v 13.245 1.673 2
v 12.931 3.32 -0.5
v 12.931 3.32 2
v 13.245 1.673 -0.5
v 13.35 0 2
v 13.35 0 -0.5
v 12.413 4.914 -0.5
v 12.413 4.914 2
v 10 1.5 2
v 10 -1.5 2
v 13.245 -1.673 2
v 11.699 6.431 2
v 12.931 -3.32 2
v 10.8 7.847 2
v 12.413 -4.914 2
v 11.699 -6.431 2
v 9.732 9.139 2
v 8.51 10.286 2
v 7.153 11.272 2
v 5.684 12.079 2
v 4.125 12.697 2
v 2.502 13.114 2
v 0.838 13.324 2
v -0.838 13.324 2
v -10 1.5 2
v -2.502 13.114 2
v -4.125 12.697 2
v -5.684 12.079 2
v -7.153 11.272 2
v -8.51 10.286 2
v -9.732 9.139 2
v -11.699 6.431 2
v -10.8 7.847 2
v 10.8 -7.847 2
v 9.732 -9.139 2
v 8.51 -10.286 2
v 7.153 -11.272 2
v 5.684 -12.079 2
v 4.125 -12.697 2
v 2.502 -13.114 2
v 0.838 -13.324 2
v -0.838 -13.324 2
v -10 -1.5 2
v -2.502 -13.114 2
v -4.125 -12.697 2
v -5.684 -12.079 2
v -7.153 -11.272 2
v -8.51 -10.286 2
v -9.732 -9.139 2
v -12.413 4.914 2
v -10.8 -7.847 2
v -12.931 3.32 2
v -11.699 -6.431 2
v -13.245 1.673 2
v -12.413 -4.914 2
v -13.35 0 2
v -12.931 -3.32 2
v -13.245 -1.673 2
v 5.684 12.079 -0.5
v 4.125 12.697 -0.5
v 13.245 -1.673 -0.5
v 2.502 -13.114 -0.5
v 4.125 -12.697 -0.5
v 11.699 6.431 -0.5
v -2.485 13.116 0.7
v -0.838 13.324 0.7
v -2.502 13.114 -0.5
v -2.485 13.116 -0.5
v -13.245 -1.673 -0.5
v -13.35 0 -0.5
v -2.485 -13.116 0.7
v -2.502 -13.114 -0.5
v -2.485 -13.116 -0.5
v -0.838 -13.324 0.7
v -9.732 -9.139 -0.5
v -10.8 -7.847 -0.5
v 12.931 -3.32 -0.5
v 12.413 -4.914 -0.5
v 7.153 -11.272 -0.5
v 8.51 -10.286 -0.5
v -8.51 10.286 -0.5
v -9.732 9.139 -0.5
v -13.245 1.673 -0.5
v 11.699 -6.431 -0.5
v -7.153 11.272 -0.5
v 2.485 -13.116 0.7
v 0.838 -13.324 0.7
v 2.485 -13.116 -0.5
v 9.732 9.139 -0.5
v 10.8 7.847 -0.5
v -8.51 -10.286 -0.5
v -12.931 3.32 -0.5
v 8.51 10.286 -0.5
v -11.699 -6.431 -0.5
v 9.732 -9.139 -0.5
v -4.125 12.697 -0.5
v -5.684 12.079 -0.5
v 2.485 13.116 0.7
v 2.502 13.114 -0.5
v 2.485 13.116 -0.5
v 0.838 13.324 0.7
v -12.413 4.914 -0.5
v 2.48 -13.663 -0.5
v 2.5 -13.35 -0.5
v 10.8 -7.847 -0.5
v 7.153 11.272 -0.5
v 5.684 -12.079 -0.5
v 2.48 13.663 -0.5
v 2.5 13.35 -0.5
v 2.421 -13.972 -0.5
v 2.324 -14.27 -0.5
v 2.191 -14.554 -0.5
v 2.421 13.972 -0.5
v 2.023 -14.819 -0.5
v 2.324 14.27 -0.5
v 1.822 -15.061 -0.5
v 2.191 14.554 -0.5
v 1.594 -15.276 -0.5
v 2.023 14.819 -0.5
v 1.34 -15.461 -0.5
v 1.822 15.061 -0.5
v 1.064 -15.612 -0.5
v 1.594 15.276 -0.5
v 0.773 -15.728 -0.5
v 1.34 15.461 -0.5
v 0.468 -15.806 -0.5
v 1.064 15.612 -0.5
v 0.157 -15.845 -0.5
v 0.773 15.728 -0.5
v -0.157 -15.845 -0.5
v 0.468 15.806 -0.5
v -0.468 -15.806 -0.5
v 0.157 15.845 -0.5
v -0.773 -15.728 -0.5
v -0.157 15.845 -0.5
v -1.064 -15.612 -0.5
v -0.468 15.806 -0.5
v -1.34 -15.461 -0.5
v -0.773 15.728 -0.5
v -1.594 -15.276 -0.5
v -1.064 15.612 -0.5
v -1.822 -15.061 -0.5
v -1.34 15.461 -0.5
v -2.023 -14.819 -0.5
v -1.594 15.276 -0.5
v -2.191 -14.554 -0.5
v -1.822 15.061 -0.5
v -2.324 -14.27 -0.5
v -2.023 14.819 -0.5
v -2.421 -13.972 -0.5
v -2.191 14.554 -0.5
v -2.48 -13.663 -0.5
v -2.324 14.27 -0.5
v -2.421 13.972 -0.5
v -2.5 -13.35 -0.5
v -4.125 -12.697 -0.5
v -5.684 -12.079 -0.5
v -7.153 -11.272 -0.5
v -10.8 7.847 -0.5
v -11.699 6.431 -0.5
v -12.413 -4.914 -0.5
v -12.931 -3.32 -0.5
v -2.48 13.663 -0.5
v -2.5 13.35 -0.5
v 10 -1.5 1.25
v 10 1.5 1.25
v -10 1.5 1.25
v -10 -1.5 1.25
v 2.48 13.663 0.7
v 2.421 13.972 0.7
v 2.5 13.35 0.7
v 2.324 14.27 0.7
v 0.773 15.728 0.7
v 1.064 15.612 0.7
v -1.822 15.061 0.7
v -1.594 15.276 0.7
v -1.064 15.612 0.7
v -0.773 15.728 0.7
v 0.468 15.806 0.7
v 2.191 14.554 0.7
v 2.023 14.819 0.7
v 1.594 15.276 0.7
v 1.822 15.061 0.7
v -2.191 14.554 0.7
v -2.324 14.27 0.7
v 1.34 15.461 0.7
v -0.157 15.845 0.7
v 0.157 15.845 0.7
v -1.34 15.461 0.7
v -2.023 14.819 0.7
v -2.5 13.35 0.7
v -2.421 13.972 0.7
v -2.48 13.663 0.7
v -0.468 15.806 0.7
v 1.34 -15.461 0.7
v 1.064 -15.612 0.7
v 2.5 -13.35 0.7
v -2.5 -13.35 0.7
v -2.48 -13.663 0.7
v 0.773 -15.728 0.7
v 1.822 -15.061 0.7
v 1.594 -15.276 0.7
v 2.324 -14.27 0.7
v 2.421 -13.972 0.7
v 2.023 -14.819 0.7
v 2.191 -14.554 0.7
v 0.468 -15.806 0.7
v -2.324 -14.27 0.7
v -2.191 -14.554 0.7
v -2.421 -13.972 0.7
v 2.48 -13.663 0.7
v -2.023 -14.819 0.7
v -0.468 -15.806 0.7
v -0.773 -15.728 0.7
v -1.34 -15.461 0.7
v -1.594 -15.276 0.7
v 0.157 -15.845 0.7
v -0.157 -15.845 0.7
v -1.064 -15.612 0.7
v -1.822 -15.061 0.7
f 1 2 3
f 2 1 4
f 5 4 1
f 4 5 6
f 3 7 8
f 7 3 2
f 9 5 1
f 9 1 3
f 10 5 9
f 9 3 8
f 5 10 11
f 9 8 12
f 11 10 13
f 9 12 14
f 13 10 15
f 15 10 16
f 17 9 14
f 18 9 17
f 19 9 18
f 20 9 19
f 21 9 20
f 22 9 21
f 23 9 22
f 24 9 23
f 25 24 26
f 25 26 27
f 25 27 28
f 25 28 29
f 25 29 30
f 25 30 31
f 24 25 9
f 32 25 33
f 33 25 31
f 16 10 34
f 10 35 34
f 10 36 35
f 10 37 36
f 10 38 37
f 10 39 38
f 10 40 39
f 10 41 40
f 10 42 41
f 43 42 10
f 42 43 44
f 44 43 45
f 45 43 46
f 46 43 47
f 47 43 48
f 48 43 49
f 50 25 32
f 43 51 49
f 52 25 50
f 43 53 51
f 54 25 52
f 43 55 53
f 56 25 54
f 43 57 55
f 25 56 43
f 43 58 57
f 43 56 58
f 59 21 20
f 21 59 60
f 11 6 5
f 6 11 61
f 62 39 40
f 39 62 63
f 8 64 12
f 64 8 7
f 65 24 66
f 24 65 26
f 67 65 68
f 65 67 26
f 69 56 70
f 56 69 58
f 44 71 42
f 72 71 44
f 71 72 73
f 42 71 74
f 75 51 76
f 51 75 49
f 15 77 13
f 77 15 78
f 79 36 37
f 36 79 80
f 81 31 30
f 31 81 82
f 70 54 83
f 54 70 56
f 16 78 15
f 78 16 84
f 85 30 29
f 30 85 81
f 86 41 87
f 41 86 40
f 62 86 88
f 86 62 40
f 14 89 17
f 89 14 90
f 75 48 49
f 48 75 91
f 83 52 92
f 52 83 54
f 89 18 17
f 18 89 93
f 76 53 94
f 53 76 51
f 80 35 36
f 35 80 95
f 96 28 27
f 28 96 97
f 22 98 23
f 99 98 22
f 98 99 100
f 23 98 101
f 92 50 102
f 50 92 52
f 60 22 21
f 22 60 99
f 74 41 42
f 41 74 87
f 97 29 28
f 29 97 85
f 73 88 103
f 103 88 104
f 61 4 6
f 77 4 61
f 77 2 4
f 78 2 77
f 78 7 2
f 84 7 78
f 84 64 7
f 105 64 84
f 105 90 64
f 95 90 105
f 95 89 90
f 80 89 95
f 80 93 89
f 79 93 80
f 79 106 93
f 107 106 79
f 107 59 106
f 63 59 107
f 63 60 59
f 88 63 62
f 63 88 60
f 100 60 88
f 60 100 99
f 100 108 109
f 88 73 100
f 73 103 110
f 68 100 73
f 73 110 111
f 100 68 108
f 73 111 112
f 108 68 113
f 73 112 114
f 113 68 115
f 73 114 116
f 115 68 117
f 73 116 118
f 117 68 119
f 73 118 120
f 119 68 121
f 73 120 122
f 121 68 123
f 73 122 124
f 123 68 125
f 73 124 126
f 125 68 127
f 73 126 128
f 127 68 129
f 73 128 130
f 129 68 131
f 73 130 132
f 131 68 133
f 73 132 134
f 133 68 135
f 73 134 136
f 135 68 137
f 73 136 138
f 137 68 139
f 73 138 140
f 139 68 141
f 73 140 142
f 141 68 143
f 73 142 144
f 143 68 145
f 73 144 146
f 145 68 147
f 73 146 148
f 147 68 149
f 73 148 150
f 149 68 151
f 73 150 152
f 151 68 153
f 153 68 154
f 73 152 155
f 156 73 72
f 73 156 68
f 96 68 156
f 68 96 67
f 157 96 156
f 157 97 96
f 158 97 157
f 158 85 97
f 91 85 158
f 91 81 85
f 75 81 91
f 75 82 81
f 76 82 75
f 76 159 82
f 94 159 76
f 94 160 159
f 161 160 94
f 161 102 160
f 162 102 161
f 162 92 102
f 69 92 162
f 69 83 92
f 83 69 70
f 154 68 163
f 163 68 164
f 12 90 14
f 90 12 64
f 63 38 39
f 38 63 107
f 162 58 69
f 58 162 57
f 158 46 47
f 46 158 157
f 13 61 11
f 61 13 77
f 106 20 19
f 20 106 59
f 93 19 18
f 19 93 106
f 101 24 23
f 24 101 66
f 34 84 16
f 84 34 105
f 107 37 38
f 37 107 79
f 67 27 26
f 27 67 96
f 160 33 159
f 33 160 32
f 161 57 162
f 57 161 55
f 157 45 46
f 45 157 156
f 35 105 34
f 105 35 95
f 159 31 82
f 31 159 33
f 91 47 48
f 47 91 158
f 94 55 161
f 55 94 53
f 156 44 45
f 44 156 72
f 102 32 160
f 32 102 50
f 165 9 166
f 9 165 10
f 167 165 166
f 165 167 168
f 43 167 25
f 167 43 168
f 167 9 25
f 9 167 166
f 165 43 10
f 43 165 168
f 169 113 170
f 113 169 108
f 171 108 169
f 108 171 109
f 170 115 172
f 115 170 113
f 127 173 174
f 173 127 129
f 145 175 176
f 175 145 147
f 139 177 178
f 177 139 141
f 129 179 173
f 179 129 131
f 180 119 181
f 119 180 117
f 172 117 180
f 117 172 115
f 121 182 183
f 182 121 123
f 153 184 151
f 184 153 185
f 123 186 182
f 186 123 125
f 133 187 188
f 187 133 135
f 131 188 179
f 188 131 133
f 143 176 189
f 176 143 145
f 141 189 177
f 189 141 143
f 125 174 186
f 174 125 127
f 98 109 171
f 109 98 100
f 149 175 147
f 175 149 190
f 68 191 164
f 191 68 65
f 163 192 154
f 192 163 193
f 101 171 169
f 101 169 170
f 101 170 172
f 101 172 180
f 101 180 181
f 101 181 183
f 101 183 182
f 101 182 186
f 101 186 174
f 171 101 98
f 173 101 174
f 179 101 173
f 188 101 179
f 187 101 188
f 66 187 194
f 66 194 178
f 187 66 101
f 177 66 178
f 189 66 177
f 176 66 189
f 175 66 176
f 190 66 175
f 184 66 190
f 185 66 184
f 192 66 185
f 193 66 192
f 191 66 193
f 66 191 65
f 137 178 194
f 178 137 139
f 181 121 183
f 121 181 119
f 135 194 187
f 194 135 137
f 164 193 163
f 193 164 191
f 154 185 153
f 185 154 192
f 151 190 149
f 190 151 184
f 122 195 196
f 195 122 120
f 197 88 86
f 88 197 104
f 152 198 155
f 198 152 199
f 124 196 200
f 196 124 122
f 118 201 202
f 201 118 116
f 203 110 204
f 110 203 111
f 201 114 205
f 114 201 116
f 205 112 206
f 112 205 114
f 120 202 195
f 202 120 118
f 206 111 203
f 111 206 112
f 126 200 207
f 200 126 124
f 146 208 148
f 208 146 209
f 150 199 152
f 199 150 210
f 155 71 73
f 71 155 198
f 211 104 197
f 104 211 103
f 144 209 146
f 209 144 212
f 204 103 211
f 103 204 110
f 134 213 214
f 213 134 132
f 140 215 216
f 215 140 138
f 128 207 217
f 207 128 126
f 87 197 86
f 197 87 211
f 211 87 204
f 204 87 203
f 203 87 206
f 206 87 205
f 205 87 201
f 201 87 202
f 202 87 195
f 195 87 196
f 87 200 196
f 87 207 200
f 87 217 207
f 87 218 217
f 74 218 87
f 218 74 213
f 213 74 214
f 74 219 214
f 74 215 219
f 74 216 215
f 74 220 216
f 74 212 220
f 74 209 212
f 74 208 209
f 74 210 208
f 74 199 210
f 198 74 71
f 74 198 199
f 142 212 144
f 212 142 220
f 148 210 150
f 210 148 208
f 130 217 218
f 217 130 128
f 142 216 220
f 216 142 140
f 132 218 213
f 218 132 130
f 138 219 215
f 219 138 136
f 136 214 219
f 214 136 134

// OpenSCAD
$fn=50;

union(){
    translate([0, 13.35, 0.1])
        cylinder(r = 2.5, h = 1.2, center=true);

    translate([0, -13.35, 0.1])
        cylinder(r = 2.5, h = 1.2, center=true);

    translate([0, 0, 0.75])
        difference(){
            cylinder(r = 13.35, h = 2.5, center=true);
            translate([0, 0, 2])
                cube([20, 3, 3], center = true);
        }
}
